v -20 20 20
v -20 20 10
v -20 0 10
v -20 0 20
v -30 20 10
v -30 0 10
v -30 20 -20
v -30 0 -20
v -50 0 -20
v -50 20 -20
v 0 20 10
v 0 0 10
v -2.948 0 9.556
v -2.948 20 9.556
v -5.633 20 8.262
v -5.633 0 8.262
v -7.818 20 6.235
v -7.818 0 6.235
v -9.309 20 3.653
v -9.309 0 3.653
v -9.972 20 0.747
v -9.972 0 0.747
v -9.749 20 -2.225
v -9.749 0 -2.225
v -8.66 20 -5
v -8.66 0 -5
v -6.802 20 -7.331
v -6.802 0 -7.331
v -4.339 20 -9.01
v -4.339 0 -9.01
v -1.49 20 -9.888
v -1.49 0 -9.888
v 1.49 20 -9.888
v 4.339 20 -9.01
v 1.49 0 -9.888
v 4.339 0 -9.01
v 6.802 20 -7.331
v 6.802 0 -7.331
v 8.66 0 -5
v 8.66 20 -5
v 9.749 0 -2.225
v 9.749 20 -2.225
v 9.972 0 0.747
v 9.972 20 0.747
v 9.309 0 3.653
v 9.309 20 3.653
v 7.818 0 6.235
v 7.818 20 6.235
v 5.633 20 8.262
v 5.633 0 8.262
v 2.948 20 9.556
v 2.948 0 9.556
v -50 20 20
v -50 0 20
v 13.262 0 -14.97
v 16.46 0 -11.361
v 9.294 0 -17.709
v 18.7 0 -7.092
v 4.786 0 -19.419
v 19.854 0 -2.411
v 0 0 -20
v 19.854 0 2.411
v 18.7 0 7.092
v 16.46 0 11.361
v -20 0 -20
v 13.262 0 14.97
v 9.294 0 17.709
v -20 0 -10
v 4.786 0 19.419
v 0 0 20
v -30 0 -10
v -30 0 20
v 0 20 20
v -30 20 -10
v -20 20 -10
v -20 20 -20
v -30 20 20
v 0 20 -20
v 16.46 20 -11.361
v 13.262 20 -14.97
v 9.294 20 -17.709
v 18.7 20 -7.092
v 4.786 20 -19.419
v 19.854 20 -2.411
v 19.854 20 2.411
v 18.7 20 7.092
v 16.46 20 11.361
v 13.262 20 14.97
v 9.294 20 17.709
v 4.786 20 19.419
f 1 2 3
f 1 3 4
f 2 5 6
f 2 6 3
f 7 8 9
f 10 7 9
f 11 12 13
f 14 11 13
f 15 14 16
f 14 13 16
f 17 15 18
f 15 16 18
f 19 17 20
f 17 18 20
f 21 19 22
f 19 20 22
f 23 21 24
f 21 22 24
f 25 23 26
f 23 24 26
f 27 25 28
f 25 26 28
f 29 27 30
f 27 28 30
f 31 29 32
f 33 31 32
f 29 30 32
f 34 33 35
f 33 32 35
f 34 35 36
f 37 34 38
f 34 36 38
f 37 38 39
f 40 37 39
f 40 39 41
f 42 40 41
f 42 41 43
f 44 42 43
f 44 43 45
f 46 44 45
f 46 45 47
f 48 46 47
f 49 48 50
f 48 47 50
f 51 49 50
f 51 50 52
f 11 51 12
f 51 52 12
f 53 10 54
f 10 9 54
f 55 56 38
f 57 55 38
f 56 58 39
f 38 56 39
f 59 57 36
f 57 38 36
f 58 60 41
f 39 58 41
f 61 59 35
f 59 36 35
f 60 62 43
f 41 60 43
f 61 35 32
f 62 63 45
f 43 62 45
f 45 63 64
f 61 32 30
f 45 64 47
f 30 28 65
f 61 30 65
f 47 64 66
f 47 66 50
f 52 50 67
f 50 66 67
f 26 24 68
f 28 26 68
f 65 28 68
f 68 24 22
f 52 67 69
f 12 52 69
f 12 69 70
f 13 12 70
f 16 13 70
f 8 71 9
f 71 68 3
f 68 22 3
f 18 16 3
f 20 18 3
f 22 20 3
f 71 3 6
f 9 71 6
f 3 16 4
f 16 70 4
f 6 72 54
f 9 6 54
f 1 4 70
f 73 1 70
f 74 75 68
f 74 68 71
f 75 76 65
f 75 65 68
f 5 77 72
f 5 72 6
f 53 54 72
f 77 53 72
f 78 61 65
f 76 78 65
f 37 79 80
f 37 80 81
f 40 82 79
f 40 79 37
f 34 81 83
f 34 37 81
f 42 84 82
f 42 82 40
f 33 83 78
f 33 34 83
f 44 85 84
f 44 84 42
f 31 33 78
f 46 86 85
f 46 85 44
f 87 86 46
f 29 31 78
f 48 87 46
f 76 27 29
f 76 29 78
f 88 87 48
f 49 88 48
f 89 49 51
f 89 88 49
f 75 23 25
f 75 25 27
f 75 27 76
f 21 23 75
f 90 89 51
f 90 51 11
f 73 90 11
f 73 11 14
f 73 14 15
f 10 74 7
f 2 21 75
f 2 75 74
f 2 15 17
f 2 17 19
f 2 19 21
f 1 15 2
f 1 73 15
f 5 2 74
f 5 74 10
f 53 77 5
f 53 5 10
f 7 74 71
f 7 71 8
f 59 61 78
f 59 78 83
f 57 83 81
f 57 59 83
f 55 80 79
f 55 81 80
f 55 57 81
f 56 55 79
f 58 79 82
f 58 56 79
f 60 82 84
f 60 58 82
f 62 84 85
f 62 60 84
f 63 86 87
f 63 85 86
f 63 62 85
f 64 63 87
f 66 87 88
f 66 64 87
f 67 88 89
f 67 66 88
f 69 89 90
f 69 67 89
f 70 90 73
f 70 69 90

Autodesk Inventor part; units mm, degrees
ref_plane "YZ Plane" through (0, 0, 0) normal (1, 0, 0) x (0, 1, 0)
ref_plane "XZ Plane" through (0, 0, 0) normal (0, 1, 0) x (-1, 0, 0)
ref_plane "XY Plane" through (0, 0, 0) normal (0, 0, 1) x (1, 0, 0)
sketch "草圖1" plane through (0, 0, 0) normal (0, 1, 0) x (-1, 0, 0)
  circle A0 centre (0, 0) radius 20
  line L0 (0, -20) -> (50, -20)
  line L1 (50, -20) -> (50, 20)
  line L2 (50, 20) -> (0, 20)
  line L3 (0, 20) -> (0, -20)
  point P0 (0, 20)
  dimension "d0" = 40
  dimension "d1" = 50
extrude "擠出1" add sketch "草圖1" along normal blind 20
sketch "草圖2" plane through (0, 20, 0) normal (0, 1, 0) x (1, 0, 0)
  line L0 (-50, -20) -> (-50, 20) projected
  line L1 (-50, 20) -> (0, 20) projected
  arc A0 (0, -20) -> (0, 20) centre (0, 0) ccw projected
  line L2 (0, -20) -> (-50, -20) projected
  line L3 (-30, -10) -> (-20, -10)
  line L4 (-20, -10) -> (-20, -20)
  line L5 (-20, -20) -> (-30, -20)
  line L6 (-30, -20) -> (-30, -10)
  line L7 (-50, -20) -> (0, -20) projected
  dimension "d4" = 10
  dimension "d5" = 10
  dimension "d6" = 20
extrude "擠出2" cut sketch "草圖2" against normal through all contours L6 L3 L4 L2
mirror "鏡射1" about plane through (0, 0, 0) normal (0, 0, 1) of "擠出2"
sketch "草圖3" plane through (0, 20, 0) normal (0, 1, 0) x (1, 0, 0)
  arc A0 (0, -20) -> (0, 20) centre (0, 0) ccw projected
hole "孔1" at (0, 20, 0) direction (0, -1, 0) diameter 20 end through all
properties part number "32" material "鋼、碳鋼"
